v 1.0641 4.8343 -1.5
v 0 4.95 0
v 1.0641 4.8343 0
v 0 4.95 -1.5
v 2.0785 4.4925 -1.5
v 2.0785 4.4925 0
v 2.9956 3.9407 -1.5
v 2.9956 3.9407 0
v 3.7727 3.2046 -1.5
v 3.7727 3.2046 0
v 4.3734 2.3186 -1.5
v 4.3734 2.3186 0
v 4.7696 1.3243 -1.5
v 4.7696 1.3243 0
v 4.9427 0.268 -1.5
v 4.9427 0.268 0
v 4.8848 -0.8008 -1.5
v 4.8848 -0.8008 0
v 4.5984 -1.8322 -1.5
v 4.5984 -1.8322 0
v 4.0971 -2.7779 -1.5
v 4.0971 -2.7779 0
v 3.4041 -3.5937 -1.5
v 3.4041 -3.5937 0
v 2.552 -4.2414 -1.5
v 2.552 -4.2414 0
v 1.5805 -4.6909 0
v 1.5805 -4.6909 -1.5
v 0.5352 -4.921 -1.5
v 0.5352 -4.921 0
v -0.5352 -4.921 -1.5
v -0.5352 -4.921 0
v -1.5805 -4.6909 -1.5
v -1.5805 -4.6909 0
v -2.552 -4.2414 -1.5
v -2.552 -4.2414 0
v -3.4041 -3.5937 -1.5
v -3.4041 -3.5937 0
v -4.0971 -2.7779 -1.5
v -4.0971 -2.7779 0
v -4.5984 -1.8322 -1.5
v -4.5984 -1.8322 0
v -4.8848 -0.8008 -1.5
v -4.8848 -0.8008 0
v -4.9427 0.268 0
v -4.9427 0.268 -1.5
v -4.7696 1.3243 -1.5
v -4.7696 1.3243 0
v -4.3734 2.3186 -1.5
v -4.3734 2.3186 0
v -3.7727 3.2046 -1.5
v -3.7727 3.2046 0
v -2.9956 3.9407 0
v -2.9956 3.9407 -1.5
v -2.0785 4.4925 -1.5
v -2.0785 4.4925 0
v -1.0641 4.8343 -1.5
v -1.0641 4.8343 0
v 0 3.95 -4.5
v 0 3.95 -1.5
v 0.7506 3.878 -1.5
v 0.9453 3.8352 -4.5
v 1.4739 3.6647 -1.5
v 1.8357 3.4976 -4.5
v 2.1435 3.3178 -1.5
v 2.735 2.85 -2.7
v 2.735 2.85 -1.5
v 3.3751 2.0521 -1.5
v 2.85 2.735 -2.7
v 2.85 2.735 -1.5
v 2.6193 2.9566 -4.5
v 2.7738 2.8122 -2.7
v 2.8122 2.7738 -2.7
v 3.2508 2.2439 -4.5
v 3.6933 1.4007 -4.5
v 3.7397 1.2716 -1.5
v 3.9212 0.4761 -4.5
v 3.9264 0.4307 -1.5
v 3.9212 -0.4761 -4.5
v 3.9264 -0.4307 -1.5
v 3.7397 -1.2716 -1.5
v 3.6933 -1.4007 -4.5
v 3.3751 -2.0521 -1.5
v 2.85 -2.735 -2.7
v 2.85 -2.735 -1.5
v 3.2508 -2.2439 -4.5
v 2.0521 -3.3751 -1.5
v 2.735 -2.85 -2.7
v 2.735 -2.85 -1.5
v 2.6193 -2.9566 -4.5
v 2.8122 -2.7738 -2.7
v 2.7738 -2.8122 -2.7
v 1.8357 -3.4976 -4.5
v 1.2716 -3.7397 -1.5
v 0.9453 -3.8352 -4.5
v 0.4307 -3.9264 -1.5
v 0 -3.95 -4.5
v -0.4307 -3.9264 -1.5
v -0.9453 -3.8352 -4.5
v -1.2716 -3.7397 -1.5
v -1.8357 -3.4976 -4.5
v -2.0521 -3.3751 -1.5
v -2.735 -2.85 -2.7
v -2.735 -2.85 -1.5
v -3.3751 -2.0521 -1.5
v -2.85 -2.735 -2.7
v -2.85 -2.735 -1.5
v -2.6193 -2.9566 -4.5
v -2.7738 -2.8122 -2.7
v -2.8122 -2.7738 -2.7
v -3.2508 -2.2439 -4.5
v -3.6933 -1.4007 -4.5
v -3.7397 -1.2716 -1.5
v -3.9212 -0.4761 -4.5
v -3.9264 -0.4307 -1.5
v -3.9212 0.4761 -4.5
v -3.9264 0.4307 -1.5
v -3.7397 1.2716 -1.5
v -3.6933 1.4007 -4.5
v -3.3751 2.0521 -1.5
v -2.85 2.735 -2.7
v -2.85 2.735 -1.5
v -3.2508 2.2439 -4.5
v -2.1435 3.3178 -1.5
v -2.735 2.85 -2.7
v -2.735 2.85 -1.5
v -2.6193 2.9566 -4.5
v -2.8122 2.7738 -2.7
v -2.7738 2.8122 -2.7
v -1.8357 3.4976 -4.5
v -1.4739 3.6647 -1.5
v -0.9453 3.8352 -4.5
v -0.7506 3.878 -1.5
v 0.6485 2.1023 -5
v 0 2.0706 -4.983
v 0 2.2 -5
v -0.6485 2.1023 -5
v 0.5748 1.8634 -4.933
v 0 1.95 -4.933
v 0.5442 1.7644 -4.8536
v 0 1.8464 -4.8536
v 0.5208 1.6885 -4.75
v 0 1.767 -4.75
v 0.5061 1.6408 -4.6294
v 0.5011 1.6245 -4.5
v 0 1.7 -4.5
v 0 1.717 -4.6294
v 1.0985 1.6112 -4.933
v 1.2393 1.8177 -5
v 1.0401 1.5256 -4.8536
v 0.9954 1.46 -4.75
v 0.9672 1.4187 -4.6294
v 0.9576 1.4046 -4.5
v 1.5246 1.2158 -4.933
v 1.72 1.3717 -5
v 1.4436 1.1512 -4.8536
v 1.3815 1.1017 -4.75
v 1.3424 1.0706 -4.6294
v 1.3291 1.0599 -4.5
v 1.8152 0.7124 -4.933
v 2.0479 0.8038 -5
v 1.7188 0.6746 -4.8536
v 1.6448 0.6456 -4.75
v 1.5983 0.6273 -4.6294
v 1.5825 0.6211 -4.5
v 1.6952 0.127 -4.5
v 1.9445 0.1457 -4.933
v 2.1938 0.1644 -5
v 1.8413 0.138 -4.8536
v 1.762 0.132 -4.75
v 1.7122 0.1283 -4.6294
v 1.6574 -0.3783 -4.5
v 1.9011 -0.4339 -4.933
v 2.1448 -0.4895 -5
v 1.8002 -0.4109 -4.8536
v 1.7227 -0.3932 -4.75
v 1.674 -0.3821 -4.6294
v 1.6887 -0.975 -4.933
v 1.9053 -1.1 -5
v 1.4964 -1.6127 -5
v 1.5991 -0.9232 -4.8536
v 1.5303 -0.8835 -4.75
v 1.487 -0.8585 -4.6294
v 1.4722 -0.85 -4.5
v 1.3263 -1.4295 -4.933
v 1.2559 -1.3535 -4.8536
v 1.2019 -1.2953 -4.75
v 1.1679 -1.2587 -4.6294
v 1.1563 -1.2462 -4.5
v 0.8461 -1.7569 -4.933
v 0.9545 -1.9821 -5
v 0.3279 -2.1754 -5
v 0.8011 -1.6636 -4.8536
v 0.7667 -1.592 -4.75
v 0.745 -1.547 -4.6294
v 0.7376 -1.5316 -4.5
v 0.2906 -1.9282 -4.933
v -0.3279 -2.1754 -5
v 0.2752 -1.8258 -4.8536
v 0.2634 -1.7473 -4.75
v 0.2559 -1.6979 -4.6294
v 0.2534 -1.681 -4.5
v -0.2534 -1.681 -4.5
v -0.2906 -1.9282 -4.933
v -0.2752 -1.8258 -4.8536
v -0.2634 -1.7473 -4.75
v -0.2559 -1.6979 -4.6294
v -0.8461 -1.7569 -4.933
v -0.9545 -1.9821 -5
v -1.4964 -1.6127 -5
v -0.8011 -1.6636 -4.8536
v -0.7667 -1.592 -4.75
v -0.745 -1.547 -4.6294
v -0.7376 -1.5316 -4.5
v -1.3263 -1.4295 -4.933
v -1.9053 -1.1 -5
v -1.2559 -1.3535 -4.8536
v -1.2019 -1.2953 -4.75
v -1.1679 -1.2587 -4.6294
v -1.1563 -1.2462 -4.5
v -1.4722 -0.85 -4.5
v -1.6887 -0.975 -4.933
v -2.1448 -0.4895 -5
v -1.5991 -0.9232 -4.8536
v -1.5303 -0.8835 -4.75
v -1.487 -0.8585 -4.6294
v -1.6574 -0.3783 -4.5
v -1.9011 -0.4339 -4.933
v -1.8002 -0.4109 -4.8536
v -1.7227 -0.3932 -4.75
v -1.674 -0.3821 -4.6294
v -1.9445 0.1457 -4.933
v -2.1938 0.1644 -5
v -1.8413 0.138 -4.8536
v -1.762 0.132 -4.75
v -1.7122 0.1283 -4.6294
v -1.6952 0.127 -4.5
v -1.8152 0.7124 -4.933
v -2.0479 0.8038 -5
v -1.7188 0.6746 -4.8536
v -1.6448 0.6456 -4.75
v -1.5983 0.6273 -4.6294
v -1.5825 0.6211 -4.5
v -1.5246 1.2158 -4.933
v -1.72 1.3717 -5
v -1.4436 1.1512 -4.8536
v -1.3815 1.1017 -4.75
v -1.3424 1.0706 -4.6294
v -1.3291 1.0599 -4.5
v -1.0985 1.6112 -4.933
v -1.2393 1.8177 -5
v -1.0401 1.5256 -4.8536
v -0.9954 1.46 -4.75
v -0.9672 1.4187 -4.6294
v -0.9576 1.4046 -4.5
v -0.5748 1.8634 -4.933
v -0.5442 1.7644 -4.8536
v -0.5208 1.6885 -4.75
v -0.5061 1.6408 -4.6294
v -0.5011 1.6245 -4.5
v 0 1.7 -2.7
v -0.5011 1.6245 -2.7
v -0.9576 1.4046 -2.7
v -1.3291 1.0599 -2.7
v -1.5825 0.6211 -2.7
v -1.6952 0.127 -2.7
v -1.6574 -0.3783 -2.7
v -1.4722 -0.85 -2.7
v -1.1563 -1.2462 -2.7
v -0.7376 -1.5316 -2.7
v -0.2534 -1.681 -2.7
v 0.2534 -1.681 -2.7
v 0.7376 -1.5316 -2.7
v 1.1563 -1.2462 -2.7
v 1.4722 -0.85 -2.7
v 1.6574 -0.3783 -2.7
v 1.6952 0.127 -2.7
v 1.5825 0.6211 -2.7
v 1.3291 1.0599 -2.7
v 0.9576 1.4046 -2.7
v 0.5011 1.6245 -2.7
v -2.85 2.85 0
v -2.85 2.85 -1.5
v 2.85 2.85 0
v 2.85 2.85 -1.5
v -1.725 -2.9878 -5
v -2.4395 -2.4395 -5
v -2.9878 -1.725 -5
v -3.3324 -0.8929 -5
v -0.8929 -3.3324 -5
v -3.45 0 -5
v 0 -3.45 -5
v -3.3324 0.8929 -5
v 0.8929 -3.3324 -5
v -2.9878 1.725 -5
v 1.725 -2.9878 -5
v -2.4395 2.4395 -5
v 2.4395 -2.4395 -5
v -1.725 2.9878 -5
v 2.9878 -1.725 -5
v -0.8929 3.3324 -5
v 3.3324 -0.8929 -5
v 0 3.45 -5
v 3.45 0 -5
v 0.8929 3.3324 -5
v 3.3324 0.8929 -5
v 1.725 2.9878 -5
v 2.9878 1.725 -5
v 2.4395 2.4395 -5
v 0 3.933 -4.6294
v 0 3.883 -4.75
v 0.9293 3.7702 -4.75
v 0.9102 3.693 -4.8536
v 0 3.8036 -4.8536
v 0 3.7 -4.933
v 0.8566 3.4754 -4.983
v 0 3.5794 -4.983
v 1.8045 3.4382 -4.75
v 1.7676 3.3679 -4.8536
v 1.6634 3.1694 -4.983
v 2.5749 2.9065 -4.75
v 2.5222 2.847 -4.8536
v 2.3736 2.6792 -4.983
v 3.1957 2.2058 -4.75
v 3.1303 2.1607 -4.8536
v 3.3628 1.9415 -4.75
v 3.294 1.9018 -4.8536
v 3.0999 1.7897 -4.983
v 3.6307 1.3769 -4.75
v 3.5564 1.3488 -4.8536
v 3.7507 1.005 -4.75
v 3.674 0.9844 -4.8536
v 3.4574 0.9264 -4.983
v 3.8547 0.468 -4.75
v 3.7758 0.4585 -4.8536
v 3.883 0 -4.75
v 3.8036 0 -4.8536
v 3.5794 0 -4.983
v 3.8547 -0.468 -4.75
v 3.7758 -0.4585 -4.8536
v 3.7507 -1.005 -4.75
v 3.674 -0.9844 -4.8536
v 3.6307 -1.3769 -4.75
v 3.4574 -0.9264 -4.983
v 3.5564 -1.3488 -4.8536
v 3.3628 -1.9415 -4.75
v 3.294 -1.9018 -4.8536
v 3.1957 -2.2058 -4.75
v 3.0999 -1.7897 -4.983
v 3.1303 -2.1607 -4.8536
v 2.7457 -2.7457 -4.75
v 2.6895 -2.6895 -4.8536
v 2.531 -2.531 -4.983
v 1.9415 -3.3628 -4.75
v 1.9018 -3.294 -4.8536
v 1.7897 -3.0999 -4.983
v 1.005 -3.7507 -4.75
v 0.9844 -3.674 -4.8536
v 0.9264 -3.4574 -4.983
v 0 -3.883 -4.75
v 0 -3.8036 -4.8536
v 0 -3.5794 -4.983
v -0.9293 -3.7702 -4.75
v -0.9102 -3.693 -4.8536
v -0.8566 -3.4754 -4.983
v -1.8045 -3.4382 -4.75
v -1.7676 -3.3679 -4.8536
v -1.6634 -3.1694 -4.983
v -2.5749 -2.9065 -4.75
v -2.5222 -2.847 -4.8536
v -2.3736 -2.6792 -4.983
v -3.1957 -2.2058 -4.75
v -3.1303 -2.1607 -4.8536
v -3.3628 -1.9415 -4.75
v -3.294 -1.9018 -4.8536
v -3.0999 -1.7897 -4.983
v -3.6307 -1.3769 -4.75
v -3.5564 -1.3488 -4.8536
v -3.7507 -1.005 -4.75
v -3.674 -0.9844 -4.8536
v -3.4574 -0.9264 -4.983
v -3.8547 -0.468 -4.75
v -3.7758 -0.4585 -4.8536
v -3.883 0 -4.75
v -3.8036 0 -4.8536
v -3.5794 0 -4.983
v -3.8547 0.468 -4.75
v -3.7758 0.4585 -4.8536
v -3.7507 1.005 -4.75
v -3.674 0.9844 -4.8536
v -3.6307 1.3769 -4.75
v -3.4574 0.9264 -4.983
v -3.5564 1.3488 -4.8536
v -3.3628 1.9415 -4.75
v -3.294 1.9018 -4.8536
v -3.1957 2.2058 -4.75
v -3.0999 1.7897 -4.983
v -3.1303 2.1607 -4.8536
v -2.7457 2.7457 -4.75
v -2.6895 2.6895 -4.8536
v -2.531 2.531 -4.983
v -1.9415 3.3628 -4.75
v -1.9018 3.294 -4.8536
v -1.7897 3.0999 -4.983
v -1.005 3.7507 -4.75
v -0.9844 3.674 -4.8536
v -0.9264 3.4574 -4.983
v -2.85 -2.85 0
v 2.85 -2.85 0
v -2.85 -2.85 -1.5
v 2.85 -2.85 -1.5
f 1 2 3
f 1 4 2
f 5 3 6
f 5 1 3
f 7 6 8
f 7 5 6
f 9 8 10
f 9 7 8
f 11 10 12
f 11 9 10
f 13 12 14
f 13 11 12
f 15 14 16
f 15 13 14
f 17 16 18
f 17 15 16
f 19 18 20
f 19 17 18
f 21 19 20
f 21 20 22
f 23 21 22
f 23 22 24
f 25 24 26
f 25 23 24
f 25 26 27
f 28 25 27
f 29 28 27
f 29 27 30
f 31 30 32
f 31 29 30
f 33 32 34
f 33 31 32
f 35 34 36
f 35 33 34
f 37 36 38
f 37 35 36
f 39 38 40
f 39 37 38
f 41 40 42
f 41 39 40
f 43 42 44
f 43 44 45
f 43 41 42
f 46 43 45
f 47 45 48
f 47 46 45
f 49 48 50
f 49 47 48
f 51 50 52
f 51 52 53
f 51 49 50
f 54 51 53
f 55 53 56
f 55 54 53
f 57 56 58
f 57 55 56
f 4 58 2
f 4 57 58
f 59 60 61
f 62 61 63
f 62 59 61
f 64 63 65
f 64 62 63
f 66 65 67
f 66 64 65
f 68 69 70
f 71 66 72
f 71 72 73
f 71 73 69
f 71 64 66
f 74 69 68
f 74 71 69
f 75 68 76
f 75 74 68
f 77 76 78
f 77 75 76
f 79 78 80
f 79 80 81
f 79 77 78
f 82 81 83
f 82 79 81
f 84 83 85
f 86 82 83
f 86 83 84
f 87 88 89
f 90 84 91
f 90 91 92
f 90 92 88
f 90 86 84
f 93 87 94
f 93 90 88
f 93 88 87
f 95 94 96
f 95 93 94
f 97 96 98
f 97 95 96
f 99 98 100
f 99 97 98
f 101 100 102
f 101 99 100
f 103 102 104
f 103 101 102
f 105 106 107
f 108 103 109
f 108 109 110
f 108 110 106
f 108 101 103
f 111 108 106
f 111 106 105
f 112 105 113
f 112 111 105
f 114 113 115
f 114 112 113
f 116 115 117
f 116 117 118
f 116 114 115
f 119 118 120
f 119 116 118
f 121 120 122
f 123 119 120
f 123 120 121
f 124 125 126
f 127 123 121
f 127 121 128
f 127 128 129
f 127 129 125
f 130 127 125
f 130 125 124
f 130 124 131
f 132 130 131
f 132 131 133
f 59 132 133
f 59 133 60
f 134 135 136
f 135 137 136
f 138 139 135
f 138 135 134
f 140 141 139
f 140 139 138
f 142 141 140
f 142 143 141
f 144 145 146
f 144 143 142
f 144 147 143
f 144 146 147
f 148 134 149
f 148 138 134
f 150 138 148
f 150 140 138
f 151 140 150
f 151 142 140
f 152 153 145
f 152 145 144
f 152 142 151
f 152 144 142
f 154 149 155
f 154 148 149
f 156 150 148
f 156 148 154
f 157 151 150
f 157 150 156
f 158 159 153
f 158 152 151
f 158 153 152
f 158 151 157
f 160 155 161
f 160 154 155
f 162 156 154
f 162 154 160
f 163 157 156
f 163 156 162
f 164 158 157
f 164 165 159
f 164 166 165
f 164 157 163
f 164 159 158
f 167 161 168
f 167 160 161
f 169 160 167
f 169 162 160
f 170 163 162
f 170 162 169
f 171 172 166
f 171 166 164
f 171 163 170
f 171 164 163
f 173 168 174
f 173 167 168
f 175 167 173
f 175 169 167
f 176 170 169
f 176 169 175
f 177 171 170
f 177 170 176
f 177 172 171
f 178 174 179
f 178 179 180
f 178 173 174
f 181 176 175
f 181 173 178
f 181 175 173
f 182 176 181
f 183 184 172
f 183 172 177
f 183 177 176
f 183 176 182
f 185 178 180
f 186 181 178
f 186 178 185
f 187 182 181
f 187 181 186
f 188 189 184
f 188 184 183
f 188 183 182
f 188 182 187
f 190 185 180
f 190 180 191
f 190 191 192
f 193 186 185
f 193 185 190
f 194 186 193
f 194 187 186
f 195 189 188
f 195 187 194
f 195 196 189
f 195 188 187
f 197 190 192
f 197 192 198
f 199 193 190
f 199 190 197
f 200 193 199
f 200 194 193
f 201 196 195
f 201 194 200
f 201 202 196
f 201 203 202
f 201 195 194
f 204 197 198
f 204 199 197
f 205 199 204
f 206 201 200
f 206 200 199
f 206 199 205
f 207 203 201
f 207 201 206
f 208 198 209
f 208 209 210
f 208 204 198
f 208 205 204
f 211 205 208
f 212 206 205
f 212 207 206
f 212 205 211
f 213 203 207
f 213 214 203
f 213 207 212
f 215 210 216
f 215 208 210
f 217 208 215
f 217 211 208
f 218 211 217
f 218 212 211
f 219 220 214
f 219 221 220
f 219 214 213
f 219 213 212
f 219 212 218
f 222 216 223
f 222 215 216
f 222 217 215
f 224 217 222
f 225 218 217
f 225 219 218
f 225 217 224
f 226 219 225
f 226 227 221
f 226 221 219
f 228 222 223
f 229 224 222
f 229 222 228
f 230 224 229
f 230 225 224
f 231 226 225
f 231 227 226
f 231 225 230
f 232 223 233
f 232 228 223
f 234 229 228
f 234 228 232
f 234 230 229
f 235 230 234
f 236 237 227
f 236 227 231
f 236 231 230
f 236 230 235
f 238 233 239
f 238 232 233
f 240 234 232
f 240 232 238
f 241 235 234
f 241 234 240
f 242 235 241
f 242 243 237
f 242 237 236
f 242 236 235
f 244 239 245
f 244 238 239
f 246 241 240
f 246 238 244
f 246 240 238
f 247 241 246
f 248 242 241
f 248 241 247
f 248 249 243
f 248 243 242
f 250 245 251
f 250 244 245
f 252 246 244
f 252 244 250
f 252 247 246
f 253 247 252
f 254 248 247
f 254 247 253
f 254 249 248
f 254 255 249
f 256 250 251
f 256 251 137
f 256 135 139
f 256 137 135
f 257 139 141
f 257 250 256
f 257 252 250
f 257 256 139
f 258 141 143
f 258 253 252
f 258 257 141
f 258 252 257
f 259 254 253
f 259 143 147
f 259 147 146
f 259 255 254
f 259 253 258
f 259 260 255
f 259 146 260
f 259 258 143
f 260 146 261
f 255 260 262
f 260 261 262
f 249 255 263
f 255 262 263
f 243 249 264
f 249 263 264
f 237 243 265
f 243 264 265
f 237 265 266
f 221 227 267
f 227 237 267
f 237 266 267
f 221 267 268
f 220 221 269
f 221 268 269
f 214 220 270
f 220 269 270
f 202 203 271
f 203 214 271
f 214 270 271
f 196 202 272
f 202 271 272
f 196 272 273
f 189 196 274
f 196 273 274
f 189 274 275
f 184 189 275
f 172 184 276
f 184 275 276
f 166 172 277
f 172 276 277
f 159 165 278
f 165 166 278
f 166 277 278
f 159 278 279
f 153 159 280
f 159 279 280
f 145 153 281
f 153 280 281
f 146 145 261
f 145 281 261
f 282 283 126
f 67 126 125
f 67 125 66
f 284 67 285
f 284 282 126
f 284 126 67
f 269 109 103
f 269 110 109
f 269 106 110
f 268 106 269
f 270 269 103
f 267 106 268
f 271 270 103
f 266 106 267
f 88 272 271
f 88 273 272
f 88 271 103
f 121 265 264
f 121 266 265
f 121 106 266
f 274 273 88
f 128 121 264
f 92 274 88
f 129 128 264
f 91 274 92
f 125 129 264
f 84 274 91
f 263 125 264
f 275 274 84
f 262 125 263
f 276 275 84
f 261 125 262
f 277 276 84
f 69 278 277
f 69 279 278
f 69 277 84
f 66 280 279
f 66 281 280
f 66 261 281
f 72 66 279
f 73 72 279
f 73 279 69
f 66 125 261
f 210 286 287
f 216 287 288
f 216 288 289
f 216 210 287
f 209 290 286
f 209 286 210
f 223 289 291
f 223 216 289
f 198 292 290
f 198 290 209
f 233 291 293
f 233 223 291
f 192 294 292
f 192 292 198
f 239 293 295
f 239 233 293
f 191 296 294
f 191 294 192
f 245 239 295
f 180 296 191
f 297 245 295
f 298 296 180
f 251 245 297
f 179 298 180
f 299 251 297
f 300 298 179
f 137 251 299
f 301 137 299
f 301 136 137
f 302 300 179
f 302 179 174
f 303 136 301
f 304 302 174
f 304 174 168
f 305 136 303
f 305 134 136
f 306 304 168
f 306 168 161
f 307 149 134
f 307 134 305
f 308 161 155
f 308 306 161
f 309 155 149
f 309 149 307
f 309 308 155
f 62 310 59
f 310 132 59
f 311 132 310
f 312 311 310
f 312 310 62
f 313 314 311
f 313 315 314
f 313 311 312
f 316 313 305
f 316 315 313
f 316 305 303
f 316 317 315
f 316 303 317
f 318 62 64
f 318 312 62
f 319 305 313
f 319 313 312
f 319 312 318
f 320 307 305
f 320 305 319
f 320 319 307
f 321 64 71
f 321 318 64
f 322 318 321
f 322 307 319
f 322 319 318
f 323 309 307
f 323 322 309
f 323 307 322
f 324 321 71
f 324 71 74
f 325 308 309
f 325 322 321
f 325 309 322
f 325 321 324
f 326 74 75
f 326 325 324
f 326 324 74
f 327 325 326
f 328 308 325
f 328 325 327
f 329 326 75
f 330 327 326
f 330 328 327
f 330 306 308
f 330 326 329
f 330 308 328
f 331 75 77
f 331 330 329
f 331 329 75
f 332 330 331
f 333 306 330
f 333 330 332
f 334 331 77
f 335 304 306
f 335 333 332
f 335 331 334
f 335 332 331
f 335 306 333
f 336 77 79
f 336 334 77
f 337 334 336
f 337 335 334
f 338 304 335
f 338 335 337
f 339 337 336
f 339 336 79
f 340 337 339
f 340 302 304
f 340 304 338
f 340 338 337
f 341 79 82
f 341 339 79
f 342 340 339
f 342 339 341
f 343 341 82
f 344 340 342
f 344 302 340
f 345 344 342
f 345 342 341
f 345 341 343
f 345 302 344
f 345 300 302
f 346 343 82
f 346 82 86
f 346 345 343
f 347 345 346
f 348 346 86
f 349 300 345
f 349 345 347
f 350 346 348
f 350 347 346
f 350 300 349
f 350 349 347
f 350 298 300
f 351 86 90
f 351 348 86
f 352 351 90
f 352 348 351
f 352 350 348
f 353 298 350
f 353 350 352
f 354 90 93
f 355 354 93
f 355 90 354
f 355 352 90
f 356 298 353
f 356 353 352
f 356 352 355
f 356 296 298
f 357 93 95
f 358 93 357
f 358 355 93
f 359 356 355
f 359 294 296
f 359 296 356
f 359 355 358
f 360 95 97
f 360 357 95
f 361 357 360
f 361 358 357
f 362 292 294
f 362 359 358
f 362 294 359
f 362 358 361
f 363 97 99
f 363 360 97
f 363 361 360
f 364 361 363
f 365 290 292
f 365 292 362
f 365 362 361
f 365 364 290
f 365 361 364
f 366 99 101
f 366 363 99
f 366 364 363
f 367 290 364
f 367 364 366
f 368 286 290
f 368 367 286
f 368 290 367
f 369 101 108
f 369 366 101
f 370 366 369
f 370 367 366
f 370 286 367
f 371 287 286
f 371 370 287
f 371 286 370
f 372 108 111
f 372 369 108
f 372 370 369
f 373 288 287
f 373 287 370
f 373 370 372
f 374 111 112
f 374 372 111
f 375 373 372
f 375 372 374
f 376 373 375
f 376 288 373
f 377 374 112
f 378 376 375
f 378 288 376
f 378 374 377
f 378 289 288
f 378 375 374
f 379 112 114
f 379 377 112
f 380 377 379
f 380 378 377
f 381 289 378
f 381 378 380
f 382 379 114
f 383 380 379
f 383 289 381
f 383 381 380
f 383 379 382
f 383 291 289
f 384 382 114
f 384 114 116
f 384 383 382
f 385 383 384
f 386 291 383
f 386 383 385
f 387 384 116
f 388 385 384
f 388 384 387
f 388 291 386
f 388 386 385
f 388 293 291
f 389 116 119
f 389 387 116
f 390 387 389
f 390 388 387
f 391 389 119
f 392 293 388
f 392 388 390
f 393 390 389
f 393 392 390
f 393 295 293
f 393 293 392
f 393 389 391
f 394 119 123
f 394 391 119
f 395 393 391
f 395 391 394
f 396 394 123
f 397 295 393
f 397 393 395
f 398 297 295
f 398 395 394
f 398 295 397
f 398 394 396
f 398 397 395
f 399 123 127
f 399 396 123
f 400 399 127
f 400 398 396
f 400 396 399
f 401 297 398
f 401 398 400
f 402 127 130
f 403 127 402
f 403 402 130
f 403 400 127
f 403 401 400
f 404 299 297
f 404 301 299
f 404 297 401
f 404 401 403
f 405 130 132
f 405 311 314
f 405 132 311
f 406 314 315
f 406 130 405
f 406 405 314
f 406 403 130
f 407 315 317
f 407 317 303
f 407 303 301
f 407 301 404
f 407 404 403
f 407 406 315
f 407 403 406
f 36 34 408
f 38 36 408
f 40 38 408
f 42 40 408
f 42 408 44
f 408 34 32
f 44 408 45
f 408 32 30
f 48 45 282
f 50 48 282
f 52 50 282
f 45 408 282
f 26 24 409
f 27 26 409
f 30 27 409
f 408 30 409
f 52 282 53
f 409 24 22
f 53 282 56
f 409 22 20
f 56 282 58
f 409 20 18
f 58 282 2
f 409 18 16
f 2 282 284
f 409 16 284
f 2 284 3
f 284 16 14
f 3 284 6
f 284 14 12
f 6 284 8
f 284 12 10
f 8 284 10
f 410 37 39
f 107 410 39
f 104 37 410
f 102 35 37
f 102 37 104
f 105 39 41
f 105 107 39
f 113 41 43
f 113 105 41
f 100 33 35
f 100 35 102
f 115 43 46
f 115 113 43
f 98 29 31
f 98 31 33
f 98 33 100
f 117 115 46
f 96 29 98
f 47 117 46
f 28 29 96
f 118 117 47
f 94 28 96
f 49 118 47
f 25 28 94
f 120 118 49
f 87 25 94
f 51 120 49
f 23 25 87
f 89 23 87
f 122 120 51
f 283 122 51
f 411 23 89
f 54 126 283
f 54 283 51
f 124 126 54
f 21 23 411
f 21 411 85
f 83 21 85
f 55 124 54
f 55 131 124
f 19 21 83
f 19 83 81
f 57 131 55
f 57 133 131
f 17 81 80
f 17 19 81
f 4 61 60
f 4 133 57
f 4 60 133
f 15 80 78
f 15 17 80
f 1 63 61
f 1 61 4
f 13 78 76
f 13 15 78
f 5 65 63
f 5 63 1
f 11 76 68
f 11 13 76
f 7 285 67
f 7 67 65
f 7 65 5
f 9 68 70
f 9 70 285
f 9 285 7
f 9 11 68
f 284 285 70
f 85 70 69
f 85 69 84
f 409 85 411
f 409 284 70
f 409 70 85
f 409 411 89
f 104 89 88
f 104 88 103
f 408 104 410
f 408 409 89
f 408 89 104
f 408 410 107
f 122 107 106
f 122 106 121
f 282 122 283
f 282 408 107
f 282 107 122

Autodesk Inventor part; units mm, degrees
ref_plane "YZ Plane" through (0, 0, 0) normal (1, 0, 0) x (0, 1, 0)
ref_plane "XZ Plane" through (0, 0, 0) normal (0, 1, 0) x (-1, 0, 0)
ref_plane "XY Plane" through (0, 0, 0) normal (0, 0, 1) x (1, 0, 0)
sketch "Sketch1" plane through (0, 0, 0) normal (1, 0, 0) x (0, 1, 0)
  line L0 (0, 0) -> (1.7, 0) construction
  line L1 (1.7, 0) -> (4.95, 0)
  line L2 (4.95, 0) -> (4.95, -1.5)
  line L3 (4.95, -1.5) -> (3.95, -1.5)
  line L4 (3.95, -1.5) -> (3.95, -5)
  line L5 (3.95, -5) -> (1.7, -5)
  line L6 (1.7, -5) -> (1.7, 0)
  line L7 (0, 0) -> (0, -13.7466) construction
  dimension "d0" = 1.7
  dimension "d1" = 3.95
  dimension "d2" = 1
  dimension "d3" = 1.5
  dimension "d4" = 3.5
revolve "Revolution1" add sketch "Sketch1" angle 360 about axis through (0, 0, 0) along (0, 0, -1)
sketch "Sketch2" plane through (0, 0, 0) normal (0, 0, 1) x (1, 0, 0)
  line L0 (2.85, -2.85) -> (-2.85, -2.85)
  line L1 (-2.85, -2.85) -> (-2.85, 2.85)
  line L2 (-2.85, 2.85) -> (2.85, 2.85)
  line L3 (2.85, 2.85) -> (2.85, -2.85)
  line L4 (2.85, -2.85) -> (-2.85, 2.85) construction
  line L5 (-2.85, -2.85) -> (2.85, 2.85) construction
  point P0 (0, 0)
  dimension "d6" = 5.7
extrude "Extrusion1" cut sketch "Sketch2" against normal blind 2.7
fillet "Fillet1" radius 0.5 2 edges at (0, -3.95, -5) (0, -1.7, -5)
properties part number "HD_BearingShaft1"
